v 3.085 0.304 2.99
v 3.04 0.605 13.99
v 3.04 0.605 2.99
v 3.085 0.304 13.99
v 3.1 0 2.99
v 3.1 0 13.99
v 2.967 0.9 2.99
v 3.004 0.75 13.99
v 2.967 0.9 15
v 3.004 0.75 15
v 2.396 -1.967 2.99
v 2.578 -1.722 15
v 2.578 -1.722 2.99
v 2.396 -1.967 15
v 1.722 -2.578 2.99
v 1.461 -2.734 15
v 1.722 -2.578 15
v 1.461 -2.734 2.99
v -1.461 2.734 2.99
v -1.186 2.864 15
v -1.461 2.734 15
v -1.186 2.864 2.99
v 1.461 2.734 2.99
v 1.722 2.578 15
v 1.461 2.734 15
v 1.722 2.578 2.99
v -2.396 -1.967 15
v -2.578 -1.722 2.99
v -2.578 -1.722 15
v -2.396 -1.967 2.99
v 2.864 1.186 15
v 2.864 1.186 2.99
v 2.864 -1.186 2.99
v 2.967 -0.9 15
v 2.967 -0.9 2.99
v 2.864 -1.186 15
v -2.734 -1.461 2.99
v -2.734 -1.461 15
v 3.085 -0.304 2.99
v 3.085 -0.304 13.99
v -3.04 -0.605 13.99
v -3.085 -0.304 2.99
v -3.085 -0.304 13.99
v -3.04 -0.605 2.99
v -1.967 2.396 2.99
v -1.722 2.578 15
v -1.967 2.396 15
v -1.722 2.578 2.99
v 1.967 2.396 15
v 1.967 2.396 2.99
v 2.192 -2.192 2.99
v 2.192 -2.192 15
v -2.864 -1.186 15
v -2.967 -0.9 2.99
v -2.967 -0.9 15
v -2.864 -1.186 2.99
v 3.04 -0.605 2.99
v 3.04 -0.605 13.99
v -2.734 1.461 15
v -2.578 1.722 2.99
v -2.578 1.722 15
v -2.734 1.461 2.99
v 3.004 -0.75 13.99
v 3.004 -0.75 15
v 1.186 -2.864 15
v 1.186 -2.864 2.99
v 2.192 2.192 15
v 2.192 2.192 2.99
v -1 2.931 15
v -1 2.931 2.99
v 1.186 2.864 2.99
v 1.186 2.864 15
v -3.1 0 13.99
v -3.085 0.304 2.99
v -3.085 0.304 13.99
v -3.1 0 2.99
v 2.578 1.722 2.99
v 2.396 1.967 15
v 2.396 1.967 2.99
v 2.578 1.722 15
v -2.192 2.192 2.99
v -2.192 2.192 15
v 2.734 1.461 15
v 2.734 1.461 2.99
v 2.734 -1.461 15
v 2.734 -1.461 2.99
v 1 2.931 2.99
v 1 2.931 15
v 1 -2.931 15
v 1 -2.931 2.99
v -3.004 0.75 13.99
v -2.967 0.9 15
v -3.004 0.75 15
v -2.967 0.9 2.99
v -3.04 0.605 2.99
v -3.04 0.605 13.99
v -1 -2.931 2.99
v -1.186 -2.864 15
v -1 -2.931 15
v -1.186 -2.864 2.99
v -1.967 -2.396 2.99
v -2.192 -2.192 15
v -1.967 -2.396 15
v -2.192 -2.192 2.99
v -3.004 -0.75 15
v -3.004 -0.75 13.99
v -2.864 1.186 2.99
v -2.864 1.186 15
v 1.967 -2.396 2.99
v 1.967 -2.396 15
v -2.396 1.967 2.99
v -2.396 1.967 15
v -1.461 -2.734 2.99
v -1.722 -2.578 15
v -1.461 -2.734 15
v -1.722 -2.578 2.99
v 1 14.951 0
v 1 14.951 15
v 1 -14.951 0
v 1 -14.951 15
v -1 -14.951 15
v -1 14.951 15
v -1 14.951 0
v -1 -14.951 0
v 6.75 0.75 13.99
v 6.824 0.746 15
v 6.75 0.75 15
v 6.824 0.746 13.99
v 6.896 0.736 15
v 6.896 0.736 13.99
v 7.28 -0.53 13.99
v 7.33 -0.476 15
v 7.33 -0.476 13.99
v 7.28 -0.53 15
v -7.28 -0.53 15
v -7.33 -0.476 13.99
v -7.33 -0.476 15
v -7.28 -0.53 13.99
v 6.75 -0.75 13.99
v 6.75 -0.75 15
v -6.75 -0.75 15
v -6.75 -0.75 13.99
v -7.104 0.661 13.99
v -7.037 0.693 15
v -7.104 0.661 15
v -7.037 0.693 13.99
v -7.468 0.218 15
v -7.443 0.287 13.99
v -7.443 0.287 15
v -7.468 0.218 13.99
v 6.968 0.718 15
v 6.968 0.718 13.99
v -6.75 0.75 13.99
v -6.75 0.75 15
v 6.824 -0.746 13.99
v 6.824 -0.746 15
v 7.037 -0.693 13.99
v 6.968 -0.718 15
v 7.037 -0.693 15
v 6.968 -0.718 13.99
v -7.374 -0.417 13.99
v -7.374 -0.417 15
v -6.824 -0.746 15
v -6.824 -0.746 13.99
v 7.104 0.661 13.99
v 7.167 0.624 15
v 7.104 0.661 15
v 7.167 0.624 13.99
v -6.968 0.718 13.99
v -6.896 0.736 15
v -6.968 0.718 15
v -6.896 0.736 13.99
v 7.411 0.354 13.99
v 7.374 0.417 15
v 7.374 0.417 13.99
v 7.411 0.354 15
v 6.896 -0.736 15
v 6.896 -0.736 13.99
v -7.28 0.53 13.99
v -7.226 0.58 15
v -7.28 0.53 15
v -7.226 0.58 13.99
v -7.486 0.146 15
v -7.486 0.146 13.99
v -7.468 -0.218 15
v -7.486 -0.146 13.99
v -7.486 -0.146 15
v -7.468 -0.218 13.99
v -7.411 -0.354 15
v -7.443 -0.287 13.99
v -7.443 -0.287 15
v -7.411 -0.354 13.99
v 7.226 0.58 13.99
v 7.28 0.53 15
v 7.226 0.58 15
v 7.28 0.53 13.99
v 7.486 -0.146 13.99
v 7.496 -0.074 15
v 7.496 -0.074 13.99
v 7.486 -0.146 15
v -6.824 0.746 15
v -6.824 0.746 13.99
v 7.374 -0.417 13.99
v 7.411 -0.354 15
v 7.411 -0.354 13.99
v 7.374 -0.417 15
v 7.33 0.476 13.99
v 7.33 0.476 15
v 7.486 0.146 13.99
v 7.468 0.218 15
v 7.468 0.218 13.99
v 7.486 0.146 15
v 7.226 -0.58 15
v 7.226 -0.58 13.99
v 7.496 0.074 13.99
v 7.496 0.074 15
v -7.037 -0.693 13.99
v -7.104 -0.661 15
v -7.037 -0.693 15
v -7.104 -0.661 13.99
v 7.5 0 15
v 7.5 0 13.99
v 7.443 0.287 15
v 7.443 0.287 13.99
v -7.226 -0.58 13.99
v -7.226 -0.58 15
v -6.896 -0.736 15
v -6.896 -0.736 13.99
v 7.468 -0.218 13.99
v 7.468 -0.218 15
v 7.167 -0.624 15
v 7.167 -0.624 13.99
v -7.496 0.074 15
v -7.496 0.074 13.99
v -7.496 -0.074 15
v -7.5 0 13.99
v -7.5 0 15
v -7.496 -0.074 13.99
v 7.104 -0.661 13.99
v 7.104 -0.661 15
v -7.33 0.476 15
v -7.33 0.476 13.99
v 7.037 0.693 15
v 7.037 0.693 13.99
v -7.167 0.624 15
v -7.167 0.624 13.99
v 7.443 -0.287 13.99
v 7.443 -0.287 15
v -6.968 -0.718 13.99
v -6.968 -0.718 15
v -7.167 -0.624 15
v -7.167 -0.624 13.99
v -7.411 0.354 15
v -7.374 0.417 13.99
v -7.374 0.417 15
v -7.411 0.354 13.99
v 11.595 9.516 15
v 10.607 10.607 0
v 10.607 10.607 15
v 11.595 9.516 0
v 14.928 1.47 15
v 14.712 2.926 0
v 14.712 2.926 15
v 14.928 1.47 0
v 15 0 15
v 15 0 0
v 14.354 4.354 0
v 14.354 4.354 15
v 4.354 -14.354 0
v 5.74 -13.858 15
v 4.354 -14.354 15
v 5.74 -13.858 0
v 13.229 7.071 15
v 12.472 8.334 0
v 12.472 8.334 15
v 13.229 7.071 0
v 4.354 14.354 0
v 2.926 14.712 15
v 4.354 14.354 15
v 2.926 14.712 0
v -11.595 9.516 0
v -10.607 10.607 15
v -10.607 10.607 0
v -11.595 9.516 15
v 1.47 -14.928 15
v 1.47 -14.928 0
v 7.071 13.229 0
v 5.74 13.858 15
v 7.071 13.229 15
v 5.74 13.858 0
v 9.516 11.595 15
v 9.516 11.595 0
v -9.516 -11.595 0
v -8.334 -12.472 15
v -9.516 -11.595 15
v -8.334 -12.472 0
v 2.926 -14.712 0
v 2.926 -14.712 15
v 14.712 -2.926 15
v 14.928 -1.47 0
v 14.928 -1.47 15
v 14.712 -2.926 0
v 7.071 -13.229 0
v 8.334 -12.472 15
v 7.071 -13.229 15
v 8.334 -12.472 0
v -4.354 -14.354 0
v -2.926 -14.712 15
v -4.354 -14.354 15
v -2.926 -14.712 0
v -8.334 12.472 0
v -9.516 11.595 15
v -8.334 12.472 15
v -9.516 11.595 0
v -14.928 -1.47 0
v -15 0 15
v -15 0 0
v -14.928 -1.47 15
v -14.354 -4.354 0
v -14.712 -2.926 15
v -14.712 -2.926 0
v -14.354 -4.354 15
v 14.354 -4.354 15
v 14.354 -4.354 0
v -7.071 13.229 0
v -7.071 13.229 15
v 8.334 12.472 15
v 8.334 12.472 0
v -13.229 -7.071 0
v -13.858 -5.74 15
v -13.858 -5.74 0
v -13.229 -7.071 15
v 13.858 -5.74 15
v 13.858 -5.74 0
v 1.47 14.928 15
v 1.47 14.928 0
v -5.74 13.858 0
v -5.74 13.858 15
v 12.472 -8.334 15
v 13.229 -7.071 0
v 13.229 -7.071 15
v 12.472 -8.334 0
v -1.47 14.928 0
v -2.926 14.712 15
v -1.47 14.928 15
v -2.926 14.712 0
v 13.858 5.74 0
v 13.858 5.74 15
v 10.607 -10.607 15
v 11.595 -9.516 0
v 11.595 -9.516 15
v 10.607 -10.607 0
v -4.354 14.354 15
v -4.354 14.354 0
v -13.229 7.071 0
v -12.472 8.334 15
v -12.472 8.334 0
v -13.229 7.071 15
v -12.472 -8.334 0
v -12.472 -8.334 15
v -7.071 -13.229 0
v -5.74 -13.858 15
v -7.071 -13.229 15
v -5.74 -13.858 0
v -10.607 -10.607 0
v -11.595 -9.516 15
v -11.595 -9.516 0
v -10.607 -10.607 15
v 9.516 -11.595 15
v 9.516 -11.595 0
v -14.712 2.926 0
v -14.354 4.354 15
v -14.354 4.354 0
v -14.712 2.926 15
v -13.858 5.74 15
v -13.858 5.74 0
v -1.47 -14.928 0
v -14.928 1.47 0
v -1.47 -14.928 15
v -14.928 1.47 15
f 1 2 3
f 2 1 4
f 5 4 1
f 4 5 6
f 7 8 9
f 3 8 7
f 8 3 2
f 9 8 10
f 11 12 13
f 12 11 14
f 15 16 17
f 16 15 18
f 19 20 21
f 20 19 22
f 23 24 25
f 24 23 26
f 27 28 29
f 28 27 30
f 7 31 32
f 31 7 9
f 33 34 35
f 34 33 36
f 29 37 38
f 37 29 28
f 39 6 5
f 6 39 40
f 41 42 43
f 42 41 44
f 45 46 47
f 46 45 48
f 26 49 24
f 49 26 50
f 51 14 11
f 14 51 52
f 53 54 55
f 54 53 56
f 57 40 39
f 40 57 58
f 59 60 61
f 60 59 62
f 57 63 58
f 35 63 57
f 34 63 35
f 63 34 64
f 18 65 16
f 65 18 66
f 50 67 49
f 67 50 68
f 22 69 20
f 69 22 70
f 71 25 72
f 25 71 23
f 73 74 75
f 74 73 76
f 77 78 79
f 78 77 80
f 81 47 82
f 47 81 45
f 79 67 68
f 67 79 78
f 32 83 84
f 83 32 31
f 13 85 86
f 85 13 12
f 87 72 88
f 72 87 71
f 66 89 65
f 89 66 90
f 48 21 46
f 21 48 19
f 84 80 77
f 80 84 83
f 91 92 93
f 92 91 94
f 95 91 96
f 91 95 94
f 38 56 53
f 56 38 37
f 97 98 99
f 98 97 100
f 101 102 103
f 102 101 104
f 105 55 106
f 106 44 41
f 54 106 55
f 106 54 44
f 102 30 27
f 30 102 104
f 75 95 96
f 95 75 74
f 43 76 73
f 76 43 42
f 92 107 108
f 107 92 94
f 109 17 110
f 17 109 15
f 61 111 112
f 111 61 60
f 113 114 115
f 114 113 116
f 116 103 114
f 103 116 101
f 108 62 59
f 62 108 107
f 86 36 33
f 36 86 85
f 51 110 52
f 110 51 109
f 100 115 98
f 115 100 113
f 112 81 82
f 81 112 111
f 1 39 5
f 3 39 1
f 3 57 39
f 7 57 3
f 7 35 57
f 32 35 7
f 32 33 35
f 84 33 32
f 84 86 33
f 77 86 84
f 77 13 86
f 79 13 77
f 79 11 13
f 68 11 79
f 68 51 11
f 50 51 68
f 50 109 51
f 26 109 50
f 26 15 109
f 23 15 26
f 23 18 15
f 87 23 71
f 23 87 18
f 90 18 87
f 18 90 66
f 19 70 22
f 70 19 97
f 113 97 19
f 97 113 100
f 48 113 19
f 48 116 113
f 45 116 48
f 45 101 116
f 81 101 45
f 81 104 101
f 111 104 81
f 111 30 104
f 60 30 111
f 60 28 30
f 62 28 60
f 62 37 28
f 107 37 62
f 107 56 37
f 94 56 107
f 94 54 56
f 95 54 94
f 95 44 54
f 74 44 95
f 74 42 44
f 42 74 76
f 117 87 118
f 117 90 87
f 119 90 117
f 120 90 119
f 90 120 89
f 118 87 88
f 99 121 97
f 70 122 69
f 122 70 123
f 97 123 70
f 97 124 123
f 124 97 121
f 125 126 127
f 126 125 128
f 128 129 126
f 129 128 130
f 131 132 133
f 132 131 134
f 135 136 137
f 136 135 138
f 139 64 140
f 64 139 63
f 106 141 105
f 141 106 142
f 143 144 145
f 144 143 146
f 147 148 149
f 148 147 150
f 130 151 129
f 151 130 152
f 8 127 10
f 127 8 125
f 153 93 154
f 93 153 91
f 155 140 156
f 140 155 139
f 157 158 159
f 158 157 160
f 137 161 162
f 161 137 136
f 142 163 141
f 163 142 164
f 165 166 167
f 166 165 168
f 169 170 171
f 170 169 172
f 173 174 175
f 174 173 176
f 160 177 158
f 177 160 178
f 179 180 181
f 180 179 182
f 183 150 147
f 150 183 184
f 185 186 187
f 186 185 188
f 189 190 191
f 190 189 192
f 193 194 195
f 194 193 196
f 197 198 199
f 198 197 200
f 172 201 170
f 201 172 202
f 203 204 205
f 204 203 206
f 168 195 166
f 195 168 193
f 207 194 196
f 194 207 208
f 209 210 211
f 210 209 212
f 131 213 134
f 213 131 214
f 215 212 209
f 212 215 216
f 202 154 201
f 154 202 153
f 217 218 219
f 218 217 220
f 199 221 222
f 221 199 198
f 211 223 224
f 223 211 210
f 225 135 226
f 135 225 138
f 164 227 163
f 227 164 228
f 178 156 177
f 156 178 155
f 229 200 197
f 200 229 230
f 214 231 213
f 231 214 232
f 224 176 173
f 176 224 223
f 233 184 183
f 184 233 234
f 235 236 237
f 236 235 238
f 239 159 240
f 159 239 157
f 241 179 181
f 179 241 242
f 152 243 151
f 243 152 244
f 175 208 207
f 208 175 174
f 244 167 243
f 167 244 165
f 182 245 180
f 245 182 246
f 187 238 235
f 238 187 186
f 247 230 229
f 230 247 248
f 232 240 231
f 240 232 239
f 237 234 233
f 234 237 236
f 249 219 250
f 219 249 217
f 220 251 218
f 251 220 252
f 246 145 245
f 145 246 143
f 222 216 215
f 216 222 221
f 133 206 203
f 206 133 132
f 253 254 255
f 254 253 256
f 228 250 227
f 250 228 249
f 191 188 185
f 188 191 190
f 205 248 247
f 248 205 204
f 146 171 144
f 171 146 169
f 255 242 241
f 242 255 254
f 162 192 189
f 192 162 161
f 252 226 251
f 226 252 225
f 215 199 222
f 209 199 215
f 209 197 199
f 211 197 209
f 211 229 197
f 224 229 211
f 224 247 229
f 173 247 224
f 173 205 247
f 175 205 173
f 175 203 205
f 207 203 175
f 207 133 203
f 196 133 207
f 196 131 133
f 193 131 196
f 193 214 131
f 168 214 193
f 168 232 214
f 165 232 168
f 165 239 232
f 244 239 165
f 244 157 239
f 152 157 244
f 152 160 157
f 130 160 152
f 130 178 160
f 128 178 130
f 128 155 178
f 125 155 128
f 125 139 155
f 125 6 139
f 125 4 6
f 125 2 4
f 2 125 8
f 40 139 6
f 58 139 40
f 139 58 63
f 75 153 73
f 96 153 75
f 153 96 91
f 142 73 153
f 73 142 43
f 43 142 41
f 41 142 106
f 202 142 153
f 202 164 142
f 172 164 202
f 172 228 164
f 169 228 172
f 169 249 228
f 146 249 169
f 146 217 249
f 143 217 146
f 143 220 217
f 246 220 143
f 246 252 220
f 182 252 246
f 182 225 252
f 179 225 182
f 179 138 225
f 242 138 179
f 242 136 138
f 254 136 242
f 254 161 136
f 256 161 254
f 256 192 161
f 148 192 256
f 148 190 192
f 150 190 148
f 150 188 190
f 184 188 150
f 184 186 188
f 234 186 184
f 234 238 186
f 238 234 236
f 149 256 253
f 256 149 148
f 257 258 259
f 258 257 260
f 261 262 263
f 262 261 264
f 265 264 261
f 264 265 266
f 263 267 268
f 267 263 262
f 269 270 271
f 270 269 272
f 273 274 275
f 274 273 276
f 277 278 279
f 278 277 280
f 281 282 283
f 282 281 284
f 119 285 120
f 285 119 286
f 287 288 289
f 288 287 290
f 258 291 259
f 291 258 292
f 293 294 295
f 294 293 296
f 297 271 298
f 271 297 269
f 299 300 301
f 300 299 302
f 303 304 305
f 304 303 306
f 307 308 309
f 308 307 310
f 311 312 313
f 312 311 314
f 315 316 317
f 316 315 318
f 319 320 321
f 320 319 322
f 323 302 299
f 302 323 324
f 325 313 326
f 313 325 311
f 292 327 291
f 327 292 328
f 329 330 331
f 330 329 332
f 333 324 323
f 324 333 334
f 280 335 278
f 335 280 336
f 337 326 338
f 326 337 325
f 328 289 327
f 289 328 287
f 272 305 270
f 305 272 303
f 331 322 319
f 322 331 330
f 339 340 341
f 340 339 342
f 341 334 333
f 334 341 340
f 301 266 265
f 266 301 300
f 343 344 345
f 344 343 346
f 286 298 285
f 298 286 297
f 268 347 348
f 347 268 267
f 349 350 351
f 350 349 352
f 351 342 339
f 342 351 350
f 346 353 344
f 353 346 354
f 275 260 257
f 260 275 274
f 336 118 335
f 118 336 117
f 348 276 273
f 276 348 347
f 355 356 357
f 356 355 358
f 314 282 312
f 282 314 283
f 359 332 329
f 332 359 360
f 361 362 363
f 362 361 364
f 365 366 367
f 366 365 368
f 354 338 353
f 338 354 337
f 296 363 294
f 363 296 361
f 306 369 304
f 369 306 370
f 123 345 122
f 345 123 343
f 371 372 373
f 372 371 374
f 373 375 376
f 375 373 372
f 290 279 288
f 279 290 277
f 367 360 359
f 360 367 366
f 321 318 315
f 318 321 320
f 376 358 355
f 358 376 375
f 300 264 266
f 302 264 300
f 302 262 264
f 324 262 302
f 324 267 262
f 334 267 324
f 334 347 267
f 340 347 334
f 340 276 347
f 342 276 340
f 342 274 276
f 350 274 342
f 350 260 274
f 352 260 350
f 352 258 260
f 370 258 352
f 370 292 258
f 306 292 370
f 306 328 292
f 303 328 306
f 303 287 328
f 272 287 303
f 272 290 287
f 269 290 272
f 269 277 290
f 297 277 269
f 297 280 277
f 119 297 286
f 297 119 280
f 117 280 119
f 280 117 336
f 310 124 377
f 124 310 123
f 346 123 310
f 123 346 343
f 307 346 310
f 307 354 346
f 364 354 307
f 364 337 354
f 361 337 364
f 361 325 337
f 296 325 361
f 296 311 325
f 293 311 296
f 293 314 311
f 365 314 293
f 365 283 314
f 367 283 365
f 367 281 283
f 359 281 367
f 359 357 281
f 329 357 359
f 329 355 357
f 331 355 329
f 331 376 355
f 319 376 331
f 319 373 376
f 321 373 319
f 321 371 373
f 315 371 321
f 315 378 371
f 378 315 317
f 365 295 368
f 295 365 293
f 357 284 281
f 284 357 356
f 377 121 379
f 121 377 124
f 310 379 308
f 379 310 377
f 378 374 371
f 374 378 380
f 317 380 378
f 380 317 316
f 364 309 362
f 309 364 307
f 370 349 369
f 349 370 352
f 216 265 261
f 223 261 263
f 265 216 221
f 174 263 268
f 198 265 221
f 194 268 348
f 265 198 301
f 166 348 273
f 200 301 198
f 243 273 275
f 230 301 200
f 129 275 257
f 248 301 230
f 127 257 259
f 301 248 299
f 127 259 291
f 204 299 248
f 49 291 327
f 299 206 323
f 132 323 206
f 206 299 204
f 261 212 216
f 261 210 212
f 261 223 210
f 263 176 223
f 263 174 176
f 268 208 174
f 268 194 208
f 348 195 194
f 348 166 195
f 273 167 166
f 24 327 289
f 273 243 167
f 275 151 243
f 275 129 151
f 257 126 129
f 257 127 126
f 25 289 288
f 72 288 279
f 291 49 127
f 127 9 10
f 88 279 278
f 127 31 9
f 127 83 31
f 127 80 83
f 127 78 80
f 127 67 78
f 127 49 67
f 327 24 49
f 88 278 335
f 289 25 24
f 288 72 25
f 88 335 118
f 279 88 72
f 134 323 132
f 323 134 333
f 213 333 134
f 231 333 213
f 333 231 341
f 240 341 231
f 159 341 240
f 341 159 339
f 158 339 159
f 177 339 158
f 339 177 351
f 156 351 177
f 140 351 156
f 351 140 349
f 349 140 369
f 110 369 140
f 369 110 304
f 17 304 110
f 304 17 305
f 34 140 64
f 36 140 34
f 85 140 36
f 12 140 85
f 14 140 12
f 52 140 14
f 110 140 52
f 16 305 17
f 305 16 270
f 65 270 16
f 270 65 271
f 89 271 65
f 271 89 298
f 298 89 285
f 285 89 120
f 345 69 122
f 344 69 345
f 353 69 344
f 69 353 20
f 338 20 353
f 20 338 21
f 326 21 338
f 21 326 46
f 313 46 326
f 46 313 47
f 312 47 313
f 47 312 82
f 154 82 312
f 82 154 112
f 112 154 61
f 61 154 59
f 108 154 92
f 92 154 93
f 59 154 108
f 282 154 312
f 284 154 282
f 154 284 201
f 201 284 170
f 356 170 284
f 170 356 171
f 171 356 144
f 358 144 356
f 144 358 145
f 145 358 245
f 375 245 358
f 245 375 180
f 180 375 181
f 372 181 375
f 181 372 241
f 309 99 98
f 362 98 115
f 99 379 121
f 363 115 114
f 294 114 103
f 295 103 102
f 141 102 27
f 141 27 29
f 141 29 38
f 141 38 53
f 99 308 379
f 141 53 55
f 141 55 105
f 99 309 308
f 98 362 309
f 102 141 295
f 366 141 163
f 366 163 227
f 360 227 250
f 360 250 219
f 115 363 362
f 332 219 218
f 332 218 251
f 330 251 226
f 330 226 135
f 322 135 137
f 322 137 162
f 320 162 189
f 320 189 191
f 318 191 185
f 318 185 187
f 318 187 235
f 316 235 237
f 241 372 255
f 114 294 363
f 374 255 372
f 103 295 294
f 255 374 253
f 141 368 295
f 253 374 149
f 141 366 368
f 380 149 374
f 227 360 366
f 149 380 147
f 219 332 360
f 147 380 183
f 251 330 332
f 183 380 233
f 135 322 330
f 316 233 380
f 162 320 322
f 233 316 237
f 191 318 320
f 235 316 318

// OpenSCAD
// Built by bench/smallmodels/features/compiler.py from a list of features.
$fn = 64;
difference() {
  union() {
    translate([0, 0, 0]) cylinder(d = 30, h = 15);
  }
  union() {
    translate([0, 0, 2.99]) rotate([0, 0, 0]) cylinder(d = 6.2, h = 12.02);
    translate([0, 0, -0.01]) rotate([0, 0, 0]) translate([-1, -15, 0]) cube([2, 30, 15.02]);
    translate([0, 0, 13.99]) rotate([0, 0, 0]) hull() { for (s = [-1, 1]) translate([s * 6.75, 0, 0]) cylinder(d = 1.5, h = 1.02); }
  }
}
